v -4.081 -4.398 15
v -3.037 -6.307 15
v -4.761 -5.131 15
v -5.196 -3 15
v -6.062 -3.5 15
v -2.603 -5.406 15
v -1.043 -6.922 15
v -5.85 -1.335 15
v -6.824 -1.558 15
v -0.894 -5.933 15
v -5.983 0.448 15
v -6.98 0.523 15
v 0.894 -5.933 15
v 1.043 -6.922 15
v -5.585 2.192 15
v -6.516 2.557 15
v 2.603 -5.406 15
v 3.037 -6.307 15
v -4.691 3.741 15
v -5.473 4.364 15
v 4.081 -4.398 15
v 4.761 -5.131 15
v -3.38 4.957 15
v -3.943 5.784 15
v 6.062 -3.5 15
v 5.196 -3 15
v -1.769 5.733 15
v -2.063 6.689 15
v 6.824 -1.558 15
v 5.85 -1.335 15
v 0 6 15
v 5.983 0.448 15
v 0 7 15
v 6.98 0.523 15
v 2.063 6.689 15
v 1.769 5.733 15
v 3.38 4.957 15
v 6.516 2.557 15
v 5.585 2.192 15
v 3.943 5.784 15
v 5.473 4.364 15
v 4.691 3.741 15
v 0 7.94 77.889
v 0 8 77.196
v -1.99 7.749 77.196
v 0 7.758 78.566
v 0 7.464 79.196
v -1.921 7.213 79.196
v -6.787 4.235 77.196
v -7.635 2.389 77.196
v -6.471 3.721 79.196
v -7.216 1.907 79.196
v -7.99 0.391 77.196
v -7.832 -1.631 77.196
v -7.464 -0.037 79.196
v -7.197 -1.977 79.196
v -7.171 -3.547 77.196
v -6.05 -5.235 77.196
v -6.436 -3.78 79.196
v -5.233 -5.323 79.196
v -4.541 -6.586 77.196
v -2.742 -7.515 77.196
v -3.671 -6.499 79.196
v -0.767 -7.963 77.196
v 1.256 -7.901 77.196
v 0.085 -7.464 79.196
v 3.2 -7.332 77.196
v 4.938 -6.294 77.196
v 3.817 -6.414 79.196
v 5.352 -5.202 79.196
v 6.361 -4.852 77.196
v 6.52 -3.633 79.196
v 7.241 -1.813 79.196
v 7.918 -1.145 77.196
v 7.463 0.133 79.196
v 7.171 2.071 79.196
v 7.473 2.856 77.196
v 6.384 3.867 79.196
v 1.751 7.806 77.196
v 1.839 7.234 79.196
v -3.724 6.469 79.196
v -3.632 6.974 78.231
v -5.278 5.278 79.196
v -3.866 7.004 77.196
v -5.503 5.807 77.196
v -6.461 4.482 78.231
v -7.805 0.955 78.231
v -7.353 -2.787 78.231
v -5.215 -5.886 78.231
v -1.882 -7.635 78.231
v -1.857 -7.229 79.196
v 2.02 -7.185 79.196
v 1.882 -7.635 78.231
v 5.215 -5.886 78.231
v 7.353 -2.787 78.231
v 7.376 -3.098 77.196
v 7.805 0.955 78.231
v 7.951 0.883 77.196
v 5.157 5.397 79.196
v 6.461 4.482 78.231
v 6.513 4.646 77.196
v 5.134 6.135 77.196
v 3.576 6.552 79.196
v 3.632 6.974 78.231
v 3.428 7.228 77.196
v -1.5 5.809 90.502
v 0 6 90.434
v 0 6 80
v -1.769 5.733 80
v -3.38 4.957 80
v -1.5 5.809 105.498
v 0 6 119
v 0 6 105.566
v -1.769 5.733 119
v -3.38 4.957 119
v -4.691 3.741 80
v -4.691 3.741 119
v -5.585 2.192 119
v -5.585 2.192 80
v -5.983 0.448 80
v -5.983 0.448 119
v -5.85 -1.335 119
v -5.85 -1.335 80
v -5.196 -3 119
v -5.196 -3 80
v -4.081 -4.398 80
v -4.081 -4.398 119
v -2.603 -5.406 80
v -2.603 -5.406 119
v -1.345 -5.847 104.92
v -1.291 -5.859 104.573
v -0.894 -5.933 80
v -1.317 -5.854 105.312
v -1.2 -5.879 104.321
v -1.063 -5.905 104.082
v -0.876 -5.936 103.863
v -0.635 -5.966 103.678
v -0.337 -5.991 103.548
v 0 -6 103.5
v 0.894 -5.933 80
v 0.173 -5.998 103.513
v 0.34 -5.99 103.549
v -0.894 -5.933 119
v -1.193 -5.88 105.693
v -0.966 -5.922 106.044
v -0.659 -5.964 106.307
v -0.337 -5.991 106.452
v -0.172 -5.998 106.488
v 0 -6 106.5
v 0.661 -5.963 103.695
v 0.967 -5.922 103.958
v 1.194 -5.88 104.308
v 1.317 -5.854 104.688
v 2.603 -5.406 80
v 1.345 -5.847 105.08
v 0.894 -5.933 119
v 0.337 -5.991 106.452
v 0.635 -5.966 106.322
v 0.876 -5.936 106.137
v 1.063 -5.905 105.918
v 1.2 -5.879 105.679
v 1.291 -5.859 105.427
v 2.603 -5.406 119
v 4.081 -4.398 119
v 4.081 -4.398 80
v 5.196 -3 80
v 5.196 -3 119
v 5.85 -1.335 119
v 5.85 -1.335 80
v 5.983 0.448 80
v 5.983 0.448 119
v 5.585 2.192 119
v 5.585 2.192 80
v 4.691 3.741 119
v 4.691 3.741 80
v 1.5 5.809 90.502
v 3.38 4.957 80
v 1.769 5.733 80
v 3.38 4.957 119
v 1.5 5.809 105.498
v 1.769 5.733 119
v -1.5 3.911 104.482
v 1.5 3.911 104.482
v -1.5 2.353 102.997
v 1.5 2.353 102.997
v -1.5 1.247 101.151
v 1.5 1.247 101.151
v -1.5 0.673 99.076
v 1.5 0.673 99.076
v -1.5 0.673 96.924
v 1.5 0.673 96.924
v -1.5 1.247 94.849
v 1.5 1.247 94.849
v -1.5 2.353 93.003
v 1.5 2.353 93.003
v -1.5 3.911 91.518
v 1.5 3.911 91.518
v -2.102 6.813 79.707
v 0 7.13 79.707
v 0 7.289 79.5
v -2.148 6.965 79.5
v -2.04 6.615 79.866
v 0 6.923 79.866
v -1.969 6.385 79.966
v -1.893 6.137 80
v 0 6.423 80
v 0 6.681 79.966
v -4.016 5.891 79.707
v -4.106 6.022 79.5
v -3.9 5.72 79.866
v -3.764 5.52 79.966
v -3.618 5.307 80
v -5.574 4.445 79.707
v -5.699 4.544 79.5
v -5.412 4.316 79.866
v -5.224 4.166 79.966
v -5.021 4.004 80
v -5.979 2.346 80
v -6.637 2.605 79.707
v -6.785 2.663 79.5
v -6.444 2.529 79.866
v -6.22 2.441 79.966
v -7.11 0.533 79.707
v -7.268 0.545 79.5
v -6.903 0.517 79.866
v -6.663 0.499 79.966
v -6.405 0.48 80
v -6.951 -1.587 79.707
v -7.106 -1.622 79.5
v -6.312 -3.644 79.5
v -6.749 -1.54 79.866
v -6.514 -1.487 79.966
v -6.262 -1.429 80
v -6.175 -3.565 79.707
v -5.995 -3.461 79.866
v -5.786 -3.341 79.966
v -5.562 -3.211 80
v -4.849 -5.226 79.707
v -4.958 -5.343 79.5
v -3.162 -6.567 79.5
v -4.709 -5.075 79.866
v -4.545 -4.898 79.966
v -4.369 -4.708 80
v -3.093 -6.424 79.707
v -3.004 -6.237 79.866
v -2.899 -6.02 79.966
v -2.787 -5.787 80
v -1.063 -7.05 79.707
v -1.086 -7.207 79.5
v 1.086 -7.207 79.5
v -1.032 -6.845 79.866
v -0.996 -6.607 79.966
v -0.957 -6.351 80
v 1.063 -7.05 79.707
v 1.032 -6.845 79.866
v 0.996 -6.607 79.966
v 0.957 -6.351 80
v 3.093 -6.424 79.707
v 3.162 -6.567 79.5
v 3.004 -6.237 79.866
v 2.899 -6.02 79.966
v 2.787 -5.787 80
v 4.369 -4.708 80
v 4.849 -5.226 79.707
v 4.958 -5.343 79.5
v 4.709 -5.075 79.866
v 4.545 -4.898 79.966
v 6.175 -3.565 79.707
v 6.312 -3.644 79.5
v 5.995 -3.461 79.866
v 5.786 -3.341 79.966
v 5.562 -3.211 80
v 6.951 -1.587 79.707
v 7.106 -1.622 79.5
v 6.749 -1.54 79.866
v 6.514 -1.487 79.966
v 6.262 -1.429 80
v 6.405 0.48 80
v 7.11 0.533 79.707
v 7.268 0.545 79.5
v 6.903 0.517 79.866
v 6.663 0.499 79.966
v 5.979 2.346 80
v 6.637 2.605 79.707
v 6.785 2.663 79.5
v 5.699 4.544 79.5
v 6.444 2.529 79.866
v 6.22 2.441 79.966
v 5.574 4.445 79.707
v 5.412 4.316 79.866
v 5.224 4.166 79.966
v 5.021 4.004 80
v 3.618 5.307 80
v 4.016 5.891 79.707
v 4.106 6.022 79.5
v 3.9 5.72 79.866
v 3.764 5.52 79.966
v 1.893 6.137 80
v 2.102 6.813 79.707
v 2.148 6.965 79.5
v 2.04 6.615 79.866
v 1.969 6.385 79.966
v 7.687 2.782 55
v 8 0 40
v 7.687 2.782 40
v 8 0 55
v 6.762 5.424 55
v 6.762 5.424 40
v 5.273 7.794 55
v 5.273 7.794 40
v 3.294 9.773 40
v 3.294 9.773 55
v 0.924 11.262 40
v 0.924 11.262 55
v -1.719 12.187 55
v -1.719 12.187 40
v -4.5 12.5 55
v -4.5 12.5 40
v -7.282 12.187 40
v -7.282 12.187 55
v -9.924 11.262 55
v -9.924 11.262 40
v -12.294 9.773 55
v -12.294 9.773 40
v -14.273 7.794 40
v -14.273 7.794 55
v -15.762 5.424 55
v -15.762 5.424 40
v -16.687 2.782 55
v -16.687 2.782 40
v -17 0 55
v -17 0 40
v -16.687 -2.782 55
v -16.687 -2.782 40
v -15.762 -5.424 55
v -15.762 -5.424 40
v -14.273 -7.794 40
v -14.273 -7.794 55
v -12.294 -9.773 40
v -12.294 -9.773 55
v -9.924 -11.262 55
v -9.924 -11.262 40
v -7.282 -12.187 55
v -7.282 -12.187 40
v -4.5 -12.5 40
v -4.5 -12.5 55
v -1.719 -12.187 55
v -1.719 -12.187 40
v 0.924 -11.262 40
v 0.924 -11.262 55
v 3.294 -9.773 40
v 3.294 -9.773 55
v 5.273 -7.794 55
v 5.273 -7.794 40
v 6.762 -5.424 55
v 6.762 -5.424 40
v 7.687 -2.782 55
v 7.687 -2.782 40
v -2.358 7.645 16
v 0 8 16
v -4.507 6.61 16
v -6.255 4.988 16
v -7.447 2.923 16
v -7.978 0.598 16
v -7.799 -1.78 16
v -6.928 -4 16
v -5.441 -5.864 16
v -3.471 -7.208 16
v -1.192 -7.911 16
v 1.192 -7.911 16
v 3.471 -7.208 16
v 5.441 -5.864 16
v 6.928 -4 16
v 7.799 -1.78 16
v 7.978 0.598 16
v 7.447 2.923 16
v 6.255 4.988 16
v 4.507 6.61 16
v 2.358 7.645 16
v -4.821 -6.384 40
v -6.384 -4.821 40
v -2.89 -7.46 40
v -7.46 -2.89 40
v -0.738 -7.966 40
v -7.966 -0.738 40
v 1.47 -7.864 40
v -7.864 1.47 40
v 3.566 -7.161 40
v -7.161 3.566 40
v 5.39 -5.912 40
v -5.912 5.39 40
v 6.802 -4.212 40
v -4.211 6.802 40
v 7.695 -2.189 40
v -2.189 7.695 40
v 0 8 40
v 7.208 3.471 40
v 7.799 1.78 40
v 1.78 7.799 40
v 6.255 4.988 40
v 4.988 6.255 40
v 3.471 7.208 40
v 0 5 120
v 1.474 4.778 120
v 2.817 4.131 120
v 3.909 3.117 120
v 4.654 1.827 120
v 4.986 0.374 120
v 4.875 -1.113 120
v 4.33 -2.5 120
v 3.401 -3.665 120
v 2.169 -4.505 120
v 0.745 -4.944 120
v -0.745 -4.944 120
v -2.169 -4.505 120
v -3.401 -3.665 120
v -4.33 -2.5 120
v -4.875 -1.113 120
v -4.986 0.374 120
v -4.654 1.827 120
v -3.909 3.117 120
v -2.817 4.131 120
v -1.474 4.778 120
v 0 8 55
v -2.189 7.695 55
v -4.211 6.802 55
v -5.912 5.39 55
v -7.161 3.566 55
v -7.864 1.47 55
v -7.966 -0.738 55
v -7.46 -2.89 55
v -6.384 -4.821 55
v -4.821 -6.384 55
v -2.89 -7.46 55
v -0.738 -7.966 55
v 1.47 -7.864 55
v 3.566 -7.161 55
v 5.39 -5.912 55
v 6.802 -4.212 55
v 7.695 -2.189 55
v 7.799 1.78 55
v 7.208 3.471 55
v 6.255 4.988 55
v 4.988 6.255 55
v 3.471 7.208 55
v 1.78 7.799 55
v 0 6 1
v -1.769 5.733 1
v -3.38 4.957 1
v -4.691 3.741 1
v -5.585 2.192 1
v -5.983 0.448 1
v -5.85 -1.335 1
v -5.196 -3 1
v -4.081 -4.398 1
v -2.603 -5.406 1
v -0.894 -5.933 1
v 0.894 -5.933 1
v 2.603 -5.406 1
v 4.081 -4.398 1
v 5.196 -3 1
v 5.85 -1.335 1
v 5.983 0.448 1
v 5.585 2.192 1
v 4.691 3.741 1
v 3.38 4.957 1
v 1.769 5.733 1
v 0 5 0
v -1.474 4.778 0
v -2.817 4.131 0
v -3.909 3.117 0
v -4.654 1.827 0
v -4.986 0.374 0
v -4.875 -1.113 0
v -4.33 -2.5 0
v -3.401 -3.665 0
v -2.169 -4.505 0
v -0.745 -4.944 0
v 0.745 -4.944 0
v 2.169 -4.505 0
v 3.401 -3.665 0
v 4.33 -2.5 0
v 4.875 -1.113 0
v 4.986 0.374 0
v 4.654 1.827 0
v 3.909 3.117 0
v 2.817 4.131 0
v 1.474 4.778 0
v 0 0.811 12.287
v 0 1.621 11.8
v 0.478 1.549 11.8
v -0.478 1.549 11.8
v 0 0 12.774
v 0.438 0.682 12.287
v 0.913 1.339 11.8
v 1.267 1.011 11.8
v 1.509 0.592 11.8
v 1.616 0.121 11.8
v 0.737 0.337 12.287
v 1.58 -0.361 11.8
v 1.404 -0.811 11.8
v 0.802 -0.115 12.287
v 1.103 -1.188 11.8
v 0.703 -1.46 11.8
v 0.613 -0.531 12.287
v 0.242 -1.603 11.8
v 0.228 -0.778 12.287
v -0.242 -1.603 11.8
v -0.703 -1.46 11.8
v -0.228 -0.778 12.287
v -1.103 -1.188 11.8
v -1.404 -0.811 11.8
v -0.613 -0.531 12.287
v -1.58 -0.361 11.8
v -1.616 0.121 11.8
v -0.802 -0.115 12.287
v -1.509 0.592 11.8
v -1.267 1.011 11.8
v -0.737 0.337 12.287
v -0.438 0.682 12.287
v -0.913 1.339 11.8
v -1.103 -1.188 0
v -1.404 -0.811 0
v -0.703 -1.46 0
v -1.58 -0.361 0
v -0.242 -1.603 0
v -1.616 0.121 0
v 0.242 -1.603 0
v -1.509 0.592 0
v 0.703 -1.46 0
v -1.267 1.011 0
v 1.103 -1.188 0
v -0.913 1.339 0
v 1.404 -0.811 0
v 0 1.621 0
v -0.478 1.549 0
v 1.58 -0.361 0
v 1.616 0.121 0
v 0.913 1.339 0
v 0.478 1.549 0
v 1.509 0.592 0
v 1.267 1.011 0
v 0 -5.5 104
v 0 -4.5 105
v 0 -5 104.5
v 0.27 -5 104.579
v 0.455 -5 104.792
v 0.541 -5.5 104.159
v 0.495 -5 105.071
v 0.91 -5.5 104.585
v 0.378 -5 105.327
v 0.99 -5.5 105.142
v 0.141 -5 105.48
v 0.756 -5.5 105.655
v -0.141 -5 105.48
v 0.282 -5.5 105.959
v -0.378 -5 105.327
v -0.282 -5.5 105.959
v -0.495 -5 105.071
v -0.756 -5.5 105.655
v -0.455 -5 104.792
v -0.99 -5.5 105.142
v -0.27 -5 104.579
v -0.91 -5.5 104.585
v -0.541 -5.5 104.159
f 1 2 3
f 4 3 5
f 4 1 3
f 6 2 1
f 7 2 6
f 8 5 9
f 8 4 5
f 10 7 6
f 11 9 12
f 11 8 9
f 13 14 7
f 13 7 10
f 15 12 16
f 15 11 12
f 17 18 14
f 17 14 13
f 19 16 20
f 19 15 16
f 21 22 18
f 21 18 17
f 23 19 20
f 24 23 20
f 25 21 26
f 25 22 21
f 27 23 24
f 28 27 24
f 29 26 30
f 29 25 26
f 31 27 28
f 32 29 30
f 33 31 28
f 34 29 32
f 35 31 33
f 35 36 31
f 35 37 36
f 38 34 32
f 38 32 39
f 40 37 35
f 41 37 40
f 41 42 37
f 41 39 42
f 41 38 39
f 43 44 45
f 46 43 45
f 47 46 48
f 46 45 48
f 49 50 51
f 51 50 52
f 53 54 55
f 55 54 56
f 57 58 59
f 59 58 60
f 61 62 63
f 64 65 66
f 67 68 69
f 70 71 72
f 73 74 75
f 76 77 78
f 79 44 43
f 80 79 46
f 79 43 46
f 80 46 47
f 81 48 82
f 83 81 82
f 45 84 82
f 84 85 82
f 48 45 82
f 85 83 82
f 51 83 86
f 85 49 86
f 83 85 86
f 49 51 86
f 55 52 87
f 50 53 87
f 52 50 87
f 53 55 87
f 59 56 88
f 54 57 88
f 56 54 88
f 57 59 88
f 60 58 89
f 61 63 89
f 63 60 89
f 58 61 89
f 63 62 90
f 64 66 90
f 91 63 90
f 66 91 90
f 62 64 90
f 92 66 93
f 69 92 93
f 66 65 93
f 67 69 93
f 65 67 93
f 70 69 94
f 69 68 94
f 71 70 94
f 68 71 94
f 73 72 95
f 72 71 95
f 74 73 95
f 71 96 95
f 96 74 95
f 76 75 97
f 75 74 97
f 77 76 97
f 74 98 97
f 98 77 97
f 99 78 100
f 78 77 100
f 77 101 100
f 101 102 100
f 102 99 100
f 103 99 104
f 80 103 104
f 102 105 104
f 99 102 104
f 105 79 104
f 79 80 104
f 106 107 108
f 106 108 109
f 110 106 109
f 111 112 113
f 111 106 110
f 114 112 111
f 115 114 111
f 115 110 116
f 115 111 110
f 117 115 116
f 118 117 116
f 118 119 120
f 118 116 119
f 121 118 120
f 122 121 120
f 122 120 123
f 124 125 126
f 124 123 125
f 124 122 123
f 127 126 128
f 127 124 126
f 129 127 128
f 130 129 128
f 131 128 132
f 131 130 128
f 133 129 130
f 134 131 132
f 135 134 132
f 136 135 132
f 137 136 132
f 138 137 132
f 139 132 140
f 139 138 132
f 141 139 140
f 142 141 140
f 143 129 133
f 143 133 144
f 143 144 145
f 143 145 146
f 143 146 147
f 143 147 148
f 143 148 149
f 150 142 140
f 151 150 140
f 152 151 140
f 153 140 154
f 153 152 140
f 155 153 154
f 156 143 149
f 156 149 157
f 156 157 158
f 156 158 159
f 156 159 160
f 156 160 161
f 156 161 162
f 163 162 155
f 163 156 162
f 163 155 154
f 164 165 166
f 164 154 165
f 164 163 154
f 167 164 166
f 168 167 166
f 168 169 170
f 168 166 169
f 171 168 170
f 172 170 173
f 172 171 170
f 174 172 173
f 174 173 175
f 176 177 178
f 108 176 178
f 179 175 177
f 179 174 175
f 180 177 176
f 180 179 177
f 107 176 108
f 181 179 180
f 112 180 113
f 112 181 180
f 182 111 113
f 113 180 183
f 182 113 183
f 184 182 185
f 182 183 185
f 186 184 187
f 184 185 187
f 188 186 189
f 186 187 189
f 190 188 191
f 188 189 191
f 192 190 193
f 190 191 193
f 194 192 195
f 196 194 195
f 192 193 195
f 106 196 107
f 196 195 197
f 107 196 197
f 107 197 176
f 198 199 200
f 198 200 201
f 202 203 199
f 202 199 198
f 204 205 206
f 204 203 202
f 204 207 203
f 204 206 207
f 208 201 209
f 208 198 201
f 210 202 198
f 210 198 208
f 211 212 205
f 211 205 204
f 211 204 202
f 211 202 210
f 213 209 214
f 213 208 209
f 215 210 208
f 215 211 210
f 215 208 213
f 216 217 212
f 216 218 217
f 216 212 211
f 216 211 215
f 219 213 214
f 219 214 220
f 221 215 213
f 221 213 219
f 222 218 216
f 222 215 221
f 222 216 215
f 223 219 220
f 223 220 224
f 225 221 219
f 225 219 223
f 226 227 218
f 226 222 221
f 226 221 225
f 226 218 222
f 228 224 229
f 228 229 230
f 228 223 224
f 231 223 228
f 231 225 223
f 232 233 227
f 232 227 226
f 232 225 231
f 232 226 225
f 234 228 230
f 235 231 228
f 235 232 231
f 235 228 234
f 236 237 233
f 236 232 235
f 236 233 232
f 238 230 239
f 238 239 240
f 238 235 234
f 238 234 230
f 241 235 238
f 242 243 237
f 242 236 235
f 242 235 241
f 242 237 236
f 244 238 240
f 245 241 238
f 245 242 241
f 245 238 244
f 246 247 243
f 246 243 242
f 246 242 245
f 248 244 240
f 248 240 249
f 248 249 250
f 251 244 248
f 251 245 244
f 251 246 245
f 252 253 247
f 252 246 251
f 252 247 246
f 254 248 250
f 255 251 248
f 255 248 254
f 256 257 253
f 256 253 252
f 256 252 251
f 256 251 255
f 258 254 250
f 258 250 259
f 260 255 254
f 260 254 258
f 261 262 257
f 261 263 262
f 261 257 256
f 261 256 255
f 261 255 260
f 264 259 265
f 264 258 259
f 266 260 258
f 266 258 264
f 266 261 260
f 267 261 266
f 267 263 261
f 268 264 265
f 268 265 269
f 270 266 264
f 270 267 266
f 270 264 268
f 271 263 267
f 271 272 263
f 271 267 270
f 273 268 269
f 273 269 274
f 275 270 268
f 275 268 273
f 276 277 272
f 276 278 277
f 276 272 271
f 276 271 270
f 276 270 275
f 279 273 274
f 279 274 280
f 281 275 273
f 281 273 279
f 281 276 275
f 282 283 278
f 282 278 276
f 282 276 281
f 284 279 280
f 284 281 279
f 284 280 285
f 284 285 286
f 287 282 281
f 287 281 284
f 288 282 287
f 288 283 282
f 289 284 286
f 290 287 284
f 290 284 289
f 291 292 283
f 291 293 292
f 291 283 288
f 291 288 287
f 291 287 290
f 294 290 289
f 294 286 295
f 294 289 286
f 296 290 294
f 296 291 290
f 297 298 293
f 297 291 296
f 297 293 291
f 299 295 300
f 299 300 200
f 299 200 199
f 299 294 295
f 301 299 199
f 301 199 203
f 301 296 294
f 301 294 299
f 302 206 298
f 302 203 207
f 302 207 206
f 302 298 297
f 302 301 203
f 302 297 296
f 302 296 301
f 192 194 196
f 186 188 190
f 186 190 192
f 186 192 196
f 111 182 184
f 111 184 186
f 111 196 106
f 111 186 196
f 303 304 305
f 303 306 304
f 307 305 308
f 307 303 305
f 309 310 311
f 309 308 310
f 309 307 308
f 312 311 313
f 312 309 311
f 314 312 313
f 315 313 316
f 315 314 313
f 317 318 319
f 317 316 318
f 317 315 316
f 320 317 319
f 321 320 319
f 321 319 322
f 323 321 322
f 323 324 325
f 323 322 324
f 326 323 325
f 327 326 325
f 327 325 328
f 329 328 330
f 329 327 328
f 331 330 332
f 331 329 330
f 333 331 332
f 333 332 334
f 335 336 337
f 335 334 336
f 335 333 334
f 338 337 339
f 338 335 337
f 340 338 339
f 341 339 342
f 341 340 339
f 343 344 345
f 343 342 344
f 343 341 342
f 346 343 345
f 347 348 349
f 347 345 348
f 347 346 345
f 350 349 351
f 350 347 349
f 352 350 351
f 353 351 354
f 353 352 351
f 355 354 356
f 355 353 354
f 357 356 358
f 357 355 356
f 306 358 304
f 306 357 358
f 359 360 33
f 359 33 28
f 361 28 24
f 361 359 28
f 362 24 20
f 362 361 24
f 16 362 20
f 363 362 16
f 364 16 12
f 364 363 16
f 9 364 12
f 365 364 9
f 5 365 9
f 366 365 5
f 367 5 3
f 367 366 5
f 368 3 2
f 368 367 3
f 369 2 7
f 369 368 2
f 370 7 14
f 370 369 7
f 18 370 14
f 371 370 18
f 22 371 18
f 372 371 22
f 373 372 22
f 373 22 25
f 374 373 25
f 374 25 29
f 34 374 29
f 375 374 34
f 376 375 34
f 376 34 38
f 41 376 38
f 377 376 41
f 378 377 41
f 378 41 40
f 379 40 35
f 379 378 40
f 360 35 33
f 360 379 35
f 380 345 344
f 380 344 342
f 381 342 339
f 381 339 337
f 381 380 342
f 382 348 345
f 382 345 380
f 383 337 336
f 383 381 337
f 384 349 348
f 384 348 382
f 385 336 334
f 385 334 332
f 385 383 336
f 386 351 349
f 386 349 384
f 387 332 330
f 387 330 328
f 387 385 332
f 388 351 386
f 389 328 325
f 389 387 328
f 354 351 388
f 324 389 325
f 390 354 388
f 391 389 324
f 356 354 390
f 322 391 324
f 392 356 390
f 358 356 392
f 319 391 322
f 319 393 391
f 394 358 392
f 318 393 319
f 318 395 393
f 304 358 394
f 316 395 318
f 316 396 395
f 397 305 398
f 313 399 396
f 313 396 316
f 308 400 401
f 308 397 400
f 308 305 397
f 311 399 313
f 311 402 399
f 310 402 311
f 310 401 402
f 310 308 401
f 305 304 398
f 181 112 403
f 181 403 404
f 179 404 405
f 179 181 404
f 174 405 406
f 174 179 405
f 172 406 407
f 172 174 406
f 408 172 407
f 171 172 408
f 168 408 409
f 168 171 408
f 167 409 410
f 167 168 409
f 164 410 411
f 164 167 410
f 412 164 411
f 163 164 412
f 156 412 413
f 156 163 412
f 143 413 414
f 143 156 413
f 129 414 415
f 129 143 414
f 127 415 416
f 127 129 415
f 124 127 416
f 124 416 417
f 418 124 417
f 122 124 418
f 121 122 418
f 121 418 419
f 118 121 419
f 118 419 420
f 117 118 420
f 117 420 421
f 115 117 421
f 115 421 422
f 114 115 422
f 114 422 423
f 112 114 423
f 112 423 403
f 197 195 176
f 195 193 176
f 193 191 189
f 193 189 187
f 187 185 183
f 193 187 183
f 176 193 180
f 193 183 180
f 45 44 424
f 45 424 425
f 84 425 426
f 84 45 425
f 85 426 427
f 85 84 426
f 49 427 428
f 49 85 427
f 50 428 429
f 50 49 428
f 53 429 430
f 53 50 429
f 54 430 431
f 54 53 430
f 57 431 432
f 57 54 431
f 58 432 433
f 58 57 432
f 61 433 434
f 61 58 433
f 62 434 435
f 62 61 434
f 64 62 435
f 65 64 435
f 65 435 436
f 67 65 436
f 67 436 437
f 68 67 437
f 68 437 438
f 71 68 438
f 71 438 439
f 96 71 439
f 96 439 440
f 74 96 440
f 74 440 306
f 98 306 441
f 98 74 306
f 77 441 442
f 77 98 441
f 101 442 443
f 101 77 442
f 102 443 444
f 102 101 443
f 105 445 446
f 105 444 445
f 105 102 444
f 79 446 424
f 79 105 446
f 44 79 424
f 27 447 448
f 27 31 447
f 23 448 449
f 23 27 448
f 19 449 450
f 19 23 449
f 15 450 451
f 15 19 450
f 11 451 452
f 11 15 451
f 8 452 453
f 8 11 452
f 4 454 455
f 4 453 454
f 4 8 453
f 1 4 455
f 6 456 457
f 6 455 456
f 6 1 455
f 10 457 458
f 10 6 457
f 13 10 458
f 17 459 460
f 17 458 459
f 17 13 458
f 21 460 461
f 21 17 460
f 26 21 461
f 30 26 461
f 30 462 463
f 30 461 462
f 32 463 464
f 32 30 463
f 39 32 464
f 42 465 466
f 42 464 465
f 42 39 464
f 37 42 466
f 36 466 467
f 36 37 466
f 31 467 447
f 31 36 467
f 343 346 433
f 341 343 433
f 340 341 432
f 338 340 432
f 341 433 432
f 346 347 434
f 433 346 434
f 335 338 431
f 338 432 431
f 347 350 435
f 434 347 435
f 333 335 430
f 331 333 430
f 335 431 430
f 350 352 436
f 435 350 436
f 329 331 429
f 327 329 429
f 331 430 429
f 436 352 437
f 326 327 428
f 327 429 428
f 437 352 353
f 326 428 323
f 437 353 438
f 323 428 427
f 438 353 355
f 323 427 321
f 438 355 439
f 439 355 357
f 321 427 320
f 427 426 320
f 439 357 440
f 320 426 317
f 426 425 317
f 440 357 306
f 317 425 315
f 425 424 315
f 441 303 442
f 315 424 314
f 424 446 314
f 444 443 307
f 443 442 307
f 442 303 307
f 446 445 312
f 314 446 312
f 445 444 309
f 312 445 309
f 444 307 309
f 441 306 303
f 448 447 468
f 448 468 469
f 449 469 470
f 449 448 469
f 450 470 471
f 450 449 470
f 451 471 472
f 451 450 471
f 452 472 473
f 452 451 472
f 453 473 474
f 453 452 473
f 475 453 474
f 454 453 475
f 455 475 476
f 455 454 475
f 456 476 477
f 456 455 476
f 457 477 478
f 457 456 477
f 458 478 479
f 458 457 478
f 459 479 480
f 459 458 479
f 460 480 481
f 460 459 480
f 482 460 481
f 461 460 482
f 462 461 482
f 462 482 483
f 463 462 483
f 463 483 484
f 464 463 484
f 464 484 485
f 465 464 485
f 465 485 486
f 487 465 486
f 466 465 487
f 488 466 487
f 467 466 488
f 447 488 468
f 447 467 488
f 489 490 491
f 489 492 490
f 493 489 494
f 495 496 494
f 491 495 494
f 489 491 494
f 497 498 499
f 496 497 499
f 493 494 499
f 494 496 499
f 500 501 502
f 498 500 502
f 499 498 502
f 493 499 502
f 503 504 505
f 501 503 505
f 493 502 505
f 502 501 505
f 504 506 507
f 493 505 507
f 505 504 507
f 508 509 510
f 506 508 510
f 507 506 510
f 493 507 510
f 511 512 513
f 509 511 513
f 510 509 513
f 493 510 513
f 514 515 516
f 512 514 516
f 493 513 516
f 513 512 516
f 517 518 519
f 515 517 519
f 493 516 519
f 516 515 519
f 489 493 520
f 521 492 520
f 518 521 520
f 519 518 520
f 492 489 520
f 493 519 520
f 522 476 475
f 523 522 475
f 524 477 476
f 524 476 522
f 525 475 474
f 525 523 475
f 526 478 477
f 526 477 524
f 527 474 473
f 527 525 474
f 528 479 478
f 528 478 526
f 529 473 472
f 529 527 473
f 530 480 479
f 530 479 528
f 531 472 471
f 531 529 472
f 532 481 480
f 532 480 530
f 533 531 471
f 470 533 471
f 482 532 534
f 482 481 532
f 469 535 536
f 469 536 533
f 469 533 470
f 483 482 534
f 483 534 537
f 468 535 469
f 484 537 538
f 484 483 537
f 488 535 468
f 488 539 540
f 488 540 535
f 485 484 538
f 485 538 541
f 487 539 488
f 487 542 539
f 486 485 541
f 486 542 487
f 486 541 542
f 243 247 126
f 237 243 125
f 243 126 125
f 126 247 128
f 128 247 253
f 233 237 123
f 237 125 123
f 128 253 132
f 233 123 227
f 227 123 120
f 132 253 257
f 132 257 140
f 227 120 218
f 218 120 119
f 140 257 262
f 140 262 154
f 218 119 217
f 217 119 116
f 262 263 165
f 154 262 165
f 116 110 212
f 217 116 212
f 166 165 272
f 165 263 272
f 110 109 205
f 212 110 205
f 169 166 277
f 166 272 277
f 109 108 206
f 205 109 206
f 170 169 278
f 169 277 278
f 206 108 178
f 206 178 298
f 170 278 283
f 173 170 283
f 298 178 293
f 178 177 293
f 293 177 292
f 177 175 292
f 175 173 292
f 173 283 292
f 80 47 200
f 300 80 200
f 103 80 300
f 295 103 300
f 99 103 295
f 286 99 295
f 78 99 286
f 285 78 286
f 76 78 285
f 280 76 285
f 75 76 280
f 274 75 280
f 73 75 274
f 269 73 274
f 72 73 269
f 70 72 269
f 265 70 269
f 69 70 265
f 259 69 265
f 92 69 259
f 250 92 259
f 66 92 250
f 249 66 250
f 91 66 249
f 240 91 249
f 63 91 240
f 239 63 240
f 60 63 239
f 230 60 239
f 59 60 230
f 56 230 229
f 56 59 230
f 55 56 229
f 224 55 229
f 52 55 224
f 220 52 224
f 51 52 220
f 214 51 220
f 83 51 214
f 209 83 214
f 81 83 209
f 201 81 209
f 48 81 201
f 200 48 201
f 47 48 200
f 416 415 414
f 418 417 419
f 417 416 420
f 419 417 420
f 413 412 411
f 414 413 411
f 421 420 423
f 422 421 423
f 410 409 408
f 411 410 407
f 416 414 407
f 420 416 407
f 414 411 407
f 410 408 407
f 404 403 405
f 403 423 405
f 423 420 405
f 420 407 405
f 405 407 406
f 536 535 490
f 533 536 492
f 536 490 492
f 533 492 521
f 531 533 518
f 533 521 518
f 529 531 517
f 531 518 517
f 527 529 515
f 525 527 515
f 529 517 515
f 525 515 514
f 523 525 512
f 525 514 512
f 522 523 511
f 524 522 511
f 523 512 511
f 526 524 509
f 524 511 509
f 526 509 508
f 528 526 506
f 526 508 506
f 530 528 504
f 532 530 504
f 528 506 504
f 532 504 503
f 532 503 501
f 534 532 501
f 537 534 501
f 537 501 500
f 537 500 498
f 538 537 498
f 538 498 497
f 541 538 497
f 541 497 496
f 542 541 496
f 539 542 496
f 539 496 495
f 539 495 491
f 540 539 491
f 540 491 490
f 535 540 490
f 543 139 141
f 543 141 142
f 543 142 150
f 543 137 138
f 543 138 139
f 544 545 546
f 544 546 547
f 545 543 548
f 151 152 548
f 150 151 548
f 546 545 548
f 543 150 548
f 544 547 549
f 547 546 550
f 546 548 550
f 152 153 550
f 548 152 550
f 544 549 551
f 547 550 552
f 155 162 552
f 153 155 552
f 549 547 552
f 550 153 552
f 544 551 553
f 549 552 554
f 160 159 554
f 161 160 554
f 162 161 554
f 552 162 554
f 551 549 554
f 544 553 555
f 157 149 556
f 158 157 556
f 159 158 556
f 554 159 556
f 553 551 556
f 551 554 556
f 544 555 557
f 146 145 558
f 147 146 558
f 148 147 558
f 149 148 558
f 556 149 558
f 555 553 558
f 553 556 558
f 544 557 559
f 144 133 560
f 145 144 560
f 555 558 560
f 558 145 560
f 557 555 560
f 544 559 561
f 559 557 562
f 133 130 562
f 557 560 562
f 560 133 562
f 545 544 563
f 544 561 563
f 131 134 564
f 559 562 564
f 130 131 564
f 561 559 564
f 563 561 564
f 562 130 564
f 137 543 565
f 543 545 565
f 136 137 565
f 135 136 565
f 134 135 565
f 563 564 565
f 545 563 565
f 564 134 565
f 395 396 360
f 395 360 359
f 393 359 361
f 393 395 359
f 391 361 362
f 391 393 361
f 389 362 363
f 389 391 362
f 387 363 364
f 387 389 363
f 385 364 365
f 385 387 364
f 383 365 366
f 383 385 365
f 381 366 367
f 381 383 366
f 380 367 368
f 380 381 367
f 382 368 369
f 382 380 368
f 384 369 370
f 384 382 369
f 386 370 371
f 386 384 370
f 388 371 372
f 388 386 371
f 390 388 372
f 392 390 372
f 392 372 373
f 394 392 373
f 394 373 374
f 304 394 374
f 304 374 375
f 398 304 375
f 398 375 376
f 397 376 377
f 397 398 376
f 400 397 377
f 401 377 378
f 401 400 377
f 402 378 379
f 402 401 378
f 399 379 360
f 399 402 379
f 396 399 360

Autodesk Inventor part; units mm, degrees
ref_plane "YZ Plane" through (0, 0, 0) normal (1, 0, 0) x (0, 1, 0)
ref_plane "XZ Plane" through (0, 0, 0) normal (0, 1, 0) x (-1, 0, 0)
ref_plane "XY Plane" through (0, 0, 0) normal (0, 0, 1) x (1, 0, 0)
sketch "스케치1" plane through (0, 0, 0) normal (1, 0, 0) x (0, 1, 0)
  line L0 (0, 0) -> (6, 0)
  line L1 (6, 0) -> (6, 15)
  line L2 (6, 15) -> (0, 15)
  line L3 (0, 15) -> (0, 0)
  line L4 (0, 15) -> (8, 15)
  line L5 (8, 15) -> (8, 40)
  line L6 (8, 40) -> (0, 40)
  line L7 (0, 40) -> (0, 15)
  line L8 (0, 40) -> (17, 40)
  line L9 (17, 40) -> (17, 55)
  line L10 (17, 55) -> (0, 55)
  line L11 (0, 55) -> (0, 40)
  line L12 (0, 55) -> (8, 55)
  line L13 (8, 55) -> (8, 80)
  line L14 (8, 80) -> (0, 80)
  line L15 (0, 80) -> (0, 55)
  line L16 (0, 80) -> (6, 80)
  line L17 (6, 80) -> (6, 120)
  line L18 (6, 120) -> (0, 120)
  line L19 (0, 120) -> (0, 80)
  dimension "d0" = 12
  dimension "d1" = 16
  dimension "d2" = 34
  dimension "d3" = 16
  dimension "d4" = 15
  dimension "d5" = 25
  dimension "d6" = 15
  dimension "d7" = 25
  dimension "d9" = 40
  dimension "d10" = 12
revolve "회전1" add sketch "스케치1" angle 360 about axis through (0, 0, 40) along (0, 0, -1)
sketch "스케치2" plane through (0, 0, 55) normal (0, 0, 1) x (1, 0, 0)
  circle A0 centre (0, 0) radius 8 projected
  circle A1 centre (-4.5, 0) radius 12.5
  circle A2 centre (0, 0) radius 17 projected
  point P0 (0, 0)
  dimension "d11" = 25
extrude "돌출1" cut sketch "스케치2" against normal up to next contours A2
sketch "스케치3" plane through (0, 0, 0) normal (0, 0, -1) x (-1, 0, 0)
  circle A0 centre (0, 0) radius 2
  dimension "d14" = 4
hole "구멍1" at (0, 0, 0) direction (0, 0, 1) diameter 3.242 depth 11.8 tip angle 118 thread size "M4x0.7" class "6H" standard "ANSI Metric M Profile"
sketch "스케치4" plane through (0, 0, 0) normal (1, 0, 0) x (0, 1, 0)
  line L0 (8, 78.2679) -> (8, 80)
  line L1 (8, 80) -> (7, 80)
  line L2 (7, 80) -> (8, 78.2679)
  line L3 (8, 80) -> (8, 55) projected
  line L4 (-8, 80) -> (8, 80) projected
  line L5 (0, -24) -> (0, 144) projected
  point P0 (0, 0)
  dimension "d22" = 30
  dimension "d23" = 1
revolve "회전2" cut sketch "스케치4" angle 360 about axis through (0, 0, -10) along (0, 0, 1)
fillet "모깎기1" radius 4 1 edges at (0, -8, 78.2679)
fillet "모깎기2" radius 1 1 edges at (0, -7, 80)
sketch "스케치5" plane through (0, 0, 0) normal (1, 0, 0) x (0, 1, 0)
  circle A0 centre (8.6, 98) radius 8
  line L0 (6, 120) -> (6, 80) projected
  point P0 (0, 0)
  dimension "d27" = 16
  dimension "d29" = 5.4
  dimension "d30" = 18
extrude "돌출2" cut sketch "스케치5" along normal mid plane 3
sketch "스케치6" plane through (0, 0, 0) normal (1, 0, 0) x (0, 1, 0)
  line L0 (-4.5, 105) -> (-6, 105)
  line L1 (-6, 105) -> (-6, 103.5)
  line L2 (-6, 103.5) -> (-4.5, 105)
  line L3 (-6, 120) -> (-6, 80) projected
  point P0 (0, 0)
  dimension "d33" = 1.5
  dimension "d34" = 45
  dimension "d35" = 25
revolve "회전3" cut sketch "스케치6" angle 360 about axis through (0, -4.5, 105) along (0, -1, 0)
chamfer "모따기1" distance 1 angle 45 3 edges at (0, -6, 120) (0, -8, 15) (0, -6, 0)
properties part number "3강"
